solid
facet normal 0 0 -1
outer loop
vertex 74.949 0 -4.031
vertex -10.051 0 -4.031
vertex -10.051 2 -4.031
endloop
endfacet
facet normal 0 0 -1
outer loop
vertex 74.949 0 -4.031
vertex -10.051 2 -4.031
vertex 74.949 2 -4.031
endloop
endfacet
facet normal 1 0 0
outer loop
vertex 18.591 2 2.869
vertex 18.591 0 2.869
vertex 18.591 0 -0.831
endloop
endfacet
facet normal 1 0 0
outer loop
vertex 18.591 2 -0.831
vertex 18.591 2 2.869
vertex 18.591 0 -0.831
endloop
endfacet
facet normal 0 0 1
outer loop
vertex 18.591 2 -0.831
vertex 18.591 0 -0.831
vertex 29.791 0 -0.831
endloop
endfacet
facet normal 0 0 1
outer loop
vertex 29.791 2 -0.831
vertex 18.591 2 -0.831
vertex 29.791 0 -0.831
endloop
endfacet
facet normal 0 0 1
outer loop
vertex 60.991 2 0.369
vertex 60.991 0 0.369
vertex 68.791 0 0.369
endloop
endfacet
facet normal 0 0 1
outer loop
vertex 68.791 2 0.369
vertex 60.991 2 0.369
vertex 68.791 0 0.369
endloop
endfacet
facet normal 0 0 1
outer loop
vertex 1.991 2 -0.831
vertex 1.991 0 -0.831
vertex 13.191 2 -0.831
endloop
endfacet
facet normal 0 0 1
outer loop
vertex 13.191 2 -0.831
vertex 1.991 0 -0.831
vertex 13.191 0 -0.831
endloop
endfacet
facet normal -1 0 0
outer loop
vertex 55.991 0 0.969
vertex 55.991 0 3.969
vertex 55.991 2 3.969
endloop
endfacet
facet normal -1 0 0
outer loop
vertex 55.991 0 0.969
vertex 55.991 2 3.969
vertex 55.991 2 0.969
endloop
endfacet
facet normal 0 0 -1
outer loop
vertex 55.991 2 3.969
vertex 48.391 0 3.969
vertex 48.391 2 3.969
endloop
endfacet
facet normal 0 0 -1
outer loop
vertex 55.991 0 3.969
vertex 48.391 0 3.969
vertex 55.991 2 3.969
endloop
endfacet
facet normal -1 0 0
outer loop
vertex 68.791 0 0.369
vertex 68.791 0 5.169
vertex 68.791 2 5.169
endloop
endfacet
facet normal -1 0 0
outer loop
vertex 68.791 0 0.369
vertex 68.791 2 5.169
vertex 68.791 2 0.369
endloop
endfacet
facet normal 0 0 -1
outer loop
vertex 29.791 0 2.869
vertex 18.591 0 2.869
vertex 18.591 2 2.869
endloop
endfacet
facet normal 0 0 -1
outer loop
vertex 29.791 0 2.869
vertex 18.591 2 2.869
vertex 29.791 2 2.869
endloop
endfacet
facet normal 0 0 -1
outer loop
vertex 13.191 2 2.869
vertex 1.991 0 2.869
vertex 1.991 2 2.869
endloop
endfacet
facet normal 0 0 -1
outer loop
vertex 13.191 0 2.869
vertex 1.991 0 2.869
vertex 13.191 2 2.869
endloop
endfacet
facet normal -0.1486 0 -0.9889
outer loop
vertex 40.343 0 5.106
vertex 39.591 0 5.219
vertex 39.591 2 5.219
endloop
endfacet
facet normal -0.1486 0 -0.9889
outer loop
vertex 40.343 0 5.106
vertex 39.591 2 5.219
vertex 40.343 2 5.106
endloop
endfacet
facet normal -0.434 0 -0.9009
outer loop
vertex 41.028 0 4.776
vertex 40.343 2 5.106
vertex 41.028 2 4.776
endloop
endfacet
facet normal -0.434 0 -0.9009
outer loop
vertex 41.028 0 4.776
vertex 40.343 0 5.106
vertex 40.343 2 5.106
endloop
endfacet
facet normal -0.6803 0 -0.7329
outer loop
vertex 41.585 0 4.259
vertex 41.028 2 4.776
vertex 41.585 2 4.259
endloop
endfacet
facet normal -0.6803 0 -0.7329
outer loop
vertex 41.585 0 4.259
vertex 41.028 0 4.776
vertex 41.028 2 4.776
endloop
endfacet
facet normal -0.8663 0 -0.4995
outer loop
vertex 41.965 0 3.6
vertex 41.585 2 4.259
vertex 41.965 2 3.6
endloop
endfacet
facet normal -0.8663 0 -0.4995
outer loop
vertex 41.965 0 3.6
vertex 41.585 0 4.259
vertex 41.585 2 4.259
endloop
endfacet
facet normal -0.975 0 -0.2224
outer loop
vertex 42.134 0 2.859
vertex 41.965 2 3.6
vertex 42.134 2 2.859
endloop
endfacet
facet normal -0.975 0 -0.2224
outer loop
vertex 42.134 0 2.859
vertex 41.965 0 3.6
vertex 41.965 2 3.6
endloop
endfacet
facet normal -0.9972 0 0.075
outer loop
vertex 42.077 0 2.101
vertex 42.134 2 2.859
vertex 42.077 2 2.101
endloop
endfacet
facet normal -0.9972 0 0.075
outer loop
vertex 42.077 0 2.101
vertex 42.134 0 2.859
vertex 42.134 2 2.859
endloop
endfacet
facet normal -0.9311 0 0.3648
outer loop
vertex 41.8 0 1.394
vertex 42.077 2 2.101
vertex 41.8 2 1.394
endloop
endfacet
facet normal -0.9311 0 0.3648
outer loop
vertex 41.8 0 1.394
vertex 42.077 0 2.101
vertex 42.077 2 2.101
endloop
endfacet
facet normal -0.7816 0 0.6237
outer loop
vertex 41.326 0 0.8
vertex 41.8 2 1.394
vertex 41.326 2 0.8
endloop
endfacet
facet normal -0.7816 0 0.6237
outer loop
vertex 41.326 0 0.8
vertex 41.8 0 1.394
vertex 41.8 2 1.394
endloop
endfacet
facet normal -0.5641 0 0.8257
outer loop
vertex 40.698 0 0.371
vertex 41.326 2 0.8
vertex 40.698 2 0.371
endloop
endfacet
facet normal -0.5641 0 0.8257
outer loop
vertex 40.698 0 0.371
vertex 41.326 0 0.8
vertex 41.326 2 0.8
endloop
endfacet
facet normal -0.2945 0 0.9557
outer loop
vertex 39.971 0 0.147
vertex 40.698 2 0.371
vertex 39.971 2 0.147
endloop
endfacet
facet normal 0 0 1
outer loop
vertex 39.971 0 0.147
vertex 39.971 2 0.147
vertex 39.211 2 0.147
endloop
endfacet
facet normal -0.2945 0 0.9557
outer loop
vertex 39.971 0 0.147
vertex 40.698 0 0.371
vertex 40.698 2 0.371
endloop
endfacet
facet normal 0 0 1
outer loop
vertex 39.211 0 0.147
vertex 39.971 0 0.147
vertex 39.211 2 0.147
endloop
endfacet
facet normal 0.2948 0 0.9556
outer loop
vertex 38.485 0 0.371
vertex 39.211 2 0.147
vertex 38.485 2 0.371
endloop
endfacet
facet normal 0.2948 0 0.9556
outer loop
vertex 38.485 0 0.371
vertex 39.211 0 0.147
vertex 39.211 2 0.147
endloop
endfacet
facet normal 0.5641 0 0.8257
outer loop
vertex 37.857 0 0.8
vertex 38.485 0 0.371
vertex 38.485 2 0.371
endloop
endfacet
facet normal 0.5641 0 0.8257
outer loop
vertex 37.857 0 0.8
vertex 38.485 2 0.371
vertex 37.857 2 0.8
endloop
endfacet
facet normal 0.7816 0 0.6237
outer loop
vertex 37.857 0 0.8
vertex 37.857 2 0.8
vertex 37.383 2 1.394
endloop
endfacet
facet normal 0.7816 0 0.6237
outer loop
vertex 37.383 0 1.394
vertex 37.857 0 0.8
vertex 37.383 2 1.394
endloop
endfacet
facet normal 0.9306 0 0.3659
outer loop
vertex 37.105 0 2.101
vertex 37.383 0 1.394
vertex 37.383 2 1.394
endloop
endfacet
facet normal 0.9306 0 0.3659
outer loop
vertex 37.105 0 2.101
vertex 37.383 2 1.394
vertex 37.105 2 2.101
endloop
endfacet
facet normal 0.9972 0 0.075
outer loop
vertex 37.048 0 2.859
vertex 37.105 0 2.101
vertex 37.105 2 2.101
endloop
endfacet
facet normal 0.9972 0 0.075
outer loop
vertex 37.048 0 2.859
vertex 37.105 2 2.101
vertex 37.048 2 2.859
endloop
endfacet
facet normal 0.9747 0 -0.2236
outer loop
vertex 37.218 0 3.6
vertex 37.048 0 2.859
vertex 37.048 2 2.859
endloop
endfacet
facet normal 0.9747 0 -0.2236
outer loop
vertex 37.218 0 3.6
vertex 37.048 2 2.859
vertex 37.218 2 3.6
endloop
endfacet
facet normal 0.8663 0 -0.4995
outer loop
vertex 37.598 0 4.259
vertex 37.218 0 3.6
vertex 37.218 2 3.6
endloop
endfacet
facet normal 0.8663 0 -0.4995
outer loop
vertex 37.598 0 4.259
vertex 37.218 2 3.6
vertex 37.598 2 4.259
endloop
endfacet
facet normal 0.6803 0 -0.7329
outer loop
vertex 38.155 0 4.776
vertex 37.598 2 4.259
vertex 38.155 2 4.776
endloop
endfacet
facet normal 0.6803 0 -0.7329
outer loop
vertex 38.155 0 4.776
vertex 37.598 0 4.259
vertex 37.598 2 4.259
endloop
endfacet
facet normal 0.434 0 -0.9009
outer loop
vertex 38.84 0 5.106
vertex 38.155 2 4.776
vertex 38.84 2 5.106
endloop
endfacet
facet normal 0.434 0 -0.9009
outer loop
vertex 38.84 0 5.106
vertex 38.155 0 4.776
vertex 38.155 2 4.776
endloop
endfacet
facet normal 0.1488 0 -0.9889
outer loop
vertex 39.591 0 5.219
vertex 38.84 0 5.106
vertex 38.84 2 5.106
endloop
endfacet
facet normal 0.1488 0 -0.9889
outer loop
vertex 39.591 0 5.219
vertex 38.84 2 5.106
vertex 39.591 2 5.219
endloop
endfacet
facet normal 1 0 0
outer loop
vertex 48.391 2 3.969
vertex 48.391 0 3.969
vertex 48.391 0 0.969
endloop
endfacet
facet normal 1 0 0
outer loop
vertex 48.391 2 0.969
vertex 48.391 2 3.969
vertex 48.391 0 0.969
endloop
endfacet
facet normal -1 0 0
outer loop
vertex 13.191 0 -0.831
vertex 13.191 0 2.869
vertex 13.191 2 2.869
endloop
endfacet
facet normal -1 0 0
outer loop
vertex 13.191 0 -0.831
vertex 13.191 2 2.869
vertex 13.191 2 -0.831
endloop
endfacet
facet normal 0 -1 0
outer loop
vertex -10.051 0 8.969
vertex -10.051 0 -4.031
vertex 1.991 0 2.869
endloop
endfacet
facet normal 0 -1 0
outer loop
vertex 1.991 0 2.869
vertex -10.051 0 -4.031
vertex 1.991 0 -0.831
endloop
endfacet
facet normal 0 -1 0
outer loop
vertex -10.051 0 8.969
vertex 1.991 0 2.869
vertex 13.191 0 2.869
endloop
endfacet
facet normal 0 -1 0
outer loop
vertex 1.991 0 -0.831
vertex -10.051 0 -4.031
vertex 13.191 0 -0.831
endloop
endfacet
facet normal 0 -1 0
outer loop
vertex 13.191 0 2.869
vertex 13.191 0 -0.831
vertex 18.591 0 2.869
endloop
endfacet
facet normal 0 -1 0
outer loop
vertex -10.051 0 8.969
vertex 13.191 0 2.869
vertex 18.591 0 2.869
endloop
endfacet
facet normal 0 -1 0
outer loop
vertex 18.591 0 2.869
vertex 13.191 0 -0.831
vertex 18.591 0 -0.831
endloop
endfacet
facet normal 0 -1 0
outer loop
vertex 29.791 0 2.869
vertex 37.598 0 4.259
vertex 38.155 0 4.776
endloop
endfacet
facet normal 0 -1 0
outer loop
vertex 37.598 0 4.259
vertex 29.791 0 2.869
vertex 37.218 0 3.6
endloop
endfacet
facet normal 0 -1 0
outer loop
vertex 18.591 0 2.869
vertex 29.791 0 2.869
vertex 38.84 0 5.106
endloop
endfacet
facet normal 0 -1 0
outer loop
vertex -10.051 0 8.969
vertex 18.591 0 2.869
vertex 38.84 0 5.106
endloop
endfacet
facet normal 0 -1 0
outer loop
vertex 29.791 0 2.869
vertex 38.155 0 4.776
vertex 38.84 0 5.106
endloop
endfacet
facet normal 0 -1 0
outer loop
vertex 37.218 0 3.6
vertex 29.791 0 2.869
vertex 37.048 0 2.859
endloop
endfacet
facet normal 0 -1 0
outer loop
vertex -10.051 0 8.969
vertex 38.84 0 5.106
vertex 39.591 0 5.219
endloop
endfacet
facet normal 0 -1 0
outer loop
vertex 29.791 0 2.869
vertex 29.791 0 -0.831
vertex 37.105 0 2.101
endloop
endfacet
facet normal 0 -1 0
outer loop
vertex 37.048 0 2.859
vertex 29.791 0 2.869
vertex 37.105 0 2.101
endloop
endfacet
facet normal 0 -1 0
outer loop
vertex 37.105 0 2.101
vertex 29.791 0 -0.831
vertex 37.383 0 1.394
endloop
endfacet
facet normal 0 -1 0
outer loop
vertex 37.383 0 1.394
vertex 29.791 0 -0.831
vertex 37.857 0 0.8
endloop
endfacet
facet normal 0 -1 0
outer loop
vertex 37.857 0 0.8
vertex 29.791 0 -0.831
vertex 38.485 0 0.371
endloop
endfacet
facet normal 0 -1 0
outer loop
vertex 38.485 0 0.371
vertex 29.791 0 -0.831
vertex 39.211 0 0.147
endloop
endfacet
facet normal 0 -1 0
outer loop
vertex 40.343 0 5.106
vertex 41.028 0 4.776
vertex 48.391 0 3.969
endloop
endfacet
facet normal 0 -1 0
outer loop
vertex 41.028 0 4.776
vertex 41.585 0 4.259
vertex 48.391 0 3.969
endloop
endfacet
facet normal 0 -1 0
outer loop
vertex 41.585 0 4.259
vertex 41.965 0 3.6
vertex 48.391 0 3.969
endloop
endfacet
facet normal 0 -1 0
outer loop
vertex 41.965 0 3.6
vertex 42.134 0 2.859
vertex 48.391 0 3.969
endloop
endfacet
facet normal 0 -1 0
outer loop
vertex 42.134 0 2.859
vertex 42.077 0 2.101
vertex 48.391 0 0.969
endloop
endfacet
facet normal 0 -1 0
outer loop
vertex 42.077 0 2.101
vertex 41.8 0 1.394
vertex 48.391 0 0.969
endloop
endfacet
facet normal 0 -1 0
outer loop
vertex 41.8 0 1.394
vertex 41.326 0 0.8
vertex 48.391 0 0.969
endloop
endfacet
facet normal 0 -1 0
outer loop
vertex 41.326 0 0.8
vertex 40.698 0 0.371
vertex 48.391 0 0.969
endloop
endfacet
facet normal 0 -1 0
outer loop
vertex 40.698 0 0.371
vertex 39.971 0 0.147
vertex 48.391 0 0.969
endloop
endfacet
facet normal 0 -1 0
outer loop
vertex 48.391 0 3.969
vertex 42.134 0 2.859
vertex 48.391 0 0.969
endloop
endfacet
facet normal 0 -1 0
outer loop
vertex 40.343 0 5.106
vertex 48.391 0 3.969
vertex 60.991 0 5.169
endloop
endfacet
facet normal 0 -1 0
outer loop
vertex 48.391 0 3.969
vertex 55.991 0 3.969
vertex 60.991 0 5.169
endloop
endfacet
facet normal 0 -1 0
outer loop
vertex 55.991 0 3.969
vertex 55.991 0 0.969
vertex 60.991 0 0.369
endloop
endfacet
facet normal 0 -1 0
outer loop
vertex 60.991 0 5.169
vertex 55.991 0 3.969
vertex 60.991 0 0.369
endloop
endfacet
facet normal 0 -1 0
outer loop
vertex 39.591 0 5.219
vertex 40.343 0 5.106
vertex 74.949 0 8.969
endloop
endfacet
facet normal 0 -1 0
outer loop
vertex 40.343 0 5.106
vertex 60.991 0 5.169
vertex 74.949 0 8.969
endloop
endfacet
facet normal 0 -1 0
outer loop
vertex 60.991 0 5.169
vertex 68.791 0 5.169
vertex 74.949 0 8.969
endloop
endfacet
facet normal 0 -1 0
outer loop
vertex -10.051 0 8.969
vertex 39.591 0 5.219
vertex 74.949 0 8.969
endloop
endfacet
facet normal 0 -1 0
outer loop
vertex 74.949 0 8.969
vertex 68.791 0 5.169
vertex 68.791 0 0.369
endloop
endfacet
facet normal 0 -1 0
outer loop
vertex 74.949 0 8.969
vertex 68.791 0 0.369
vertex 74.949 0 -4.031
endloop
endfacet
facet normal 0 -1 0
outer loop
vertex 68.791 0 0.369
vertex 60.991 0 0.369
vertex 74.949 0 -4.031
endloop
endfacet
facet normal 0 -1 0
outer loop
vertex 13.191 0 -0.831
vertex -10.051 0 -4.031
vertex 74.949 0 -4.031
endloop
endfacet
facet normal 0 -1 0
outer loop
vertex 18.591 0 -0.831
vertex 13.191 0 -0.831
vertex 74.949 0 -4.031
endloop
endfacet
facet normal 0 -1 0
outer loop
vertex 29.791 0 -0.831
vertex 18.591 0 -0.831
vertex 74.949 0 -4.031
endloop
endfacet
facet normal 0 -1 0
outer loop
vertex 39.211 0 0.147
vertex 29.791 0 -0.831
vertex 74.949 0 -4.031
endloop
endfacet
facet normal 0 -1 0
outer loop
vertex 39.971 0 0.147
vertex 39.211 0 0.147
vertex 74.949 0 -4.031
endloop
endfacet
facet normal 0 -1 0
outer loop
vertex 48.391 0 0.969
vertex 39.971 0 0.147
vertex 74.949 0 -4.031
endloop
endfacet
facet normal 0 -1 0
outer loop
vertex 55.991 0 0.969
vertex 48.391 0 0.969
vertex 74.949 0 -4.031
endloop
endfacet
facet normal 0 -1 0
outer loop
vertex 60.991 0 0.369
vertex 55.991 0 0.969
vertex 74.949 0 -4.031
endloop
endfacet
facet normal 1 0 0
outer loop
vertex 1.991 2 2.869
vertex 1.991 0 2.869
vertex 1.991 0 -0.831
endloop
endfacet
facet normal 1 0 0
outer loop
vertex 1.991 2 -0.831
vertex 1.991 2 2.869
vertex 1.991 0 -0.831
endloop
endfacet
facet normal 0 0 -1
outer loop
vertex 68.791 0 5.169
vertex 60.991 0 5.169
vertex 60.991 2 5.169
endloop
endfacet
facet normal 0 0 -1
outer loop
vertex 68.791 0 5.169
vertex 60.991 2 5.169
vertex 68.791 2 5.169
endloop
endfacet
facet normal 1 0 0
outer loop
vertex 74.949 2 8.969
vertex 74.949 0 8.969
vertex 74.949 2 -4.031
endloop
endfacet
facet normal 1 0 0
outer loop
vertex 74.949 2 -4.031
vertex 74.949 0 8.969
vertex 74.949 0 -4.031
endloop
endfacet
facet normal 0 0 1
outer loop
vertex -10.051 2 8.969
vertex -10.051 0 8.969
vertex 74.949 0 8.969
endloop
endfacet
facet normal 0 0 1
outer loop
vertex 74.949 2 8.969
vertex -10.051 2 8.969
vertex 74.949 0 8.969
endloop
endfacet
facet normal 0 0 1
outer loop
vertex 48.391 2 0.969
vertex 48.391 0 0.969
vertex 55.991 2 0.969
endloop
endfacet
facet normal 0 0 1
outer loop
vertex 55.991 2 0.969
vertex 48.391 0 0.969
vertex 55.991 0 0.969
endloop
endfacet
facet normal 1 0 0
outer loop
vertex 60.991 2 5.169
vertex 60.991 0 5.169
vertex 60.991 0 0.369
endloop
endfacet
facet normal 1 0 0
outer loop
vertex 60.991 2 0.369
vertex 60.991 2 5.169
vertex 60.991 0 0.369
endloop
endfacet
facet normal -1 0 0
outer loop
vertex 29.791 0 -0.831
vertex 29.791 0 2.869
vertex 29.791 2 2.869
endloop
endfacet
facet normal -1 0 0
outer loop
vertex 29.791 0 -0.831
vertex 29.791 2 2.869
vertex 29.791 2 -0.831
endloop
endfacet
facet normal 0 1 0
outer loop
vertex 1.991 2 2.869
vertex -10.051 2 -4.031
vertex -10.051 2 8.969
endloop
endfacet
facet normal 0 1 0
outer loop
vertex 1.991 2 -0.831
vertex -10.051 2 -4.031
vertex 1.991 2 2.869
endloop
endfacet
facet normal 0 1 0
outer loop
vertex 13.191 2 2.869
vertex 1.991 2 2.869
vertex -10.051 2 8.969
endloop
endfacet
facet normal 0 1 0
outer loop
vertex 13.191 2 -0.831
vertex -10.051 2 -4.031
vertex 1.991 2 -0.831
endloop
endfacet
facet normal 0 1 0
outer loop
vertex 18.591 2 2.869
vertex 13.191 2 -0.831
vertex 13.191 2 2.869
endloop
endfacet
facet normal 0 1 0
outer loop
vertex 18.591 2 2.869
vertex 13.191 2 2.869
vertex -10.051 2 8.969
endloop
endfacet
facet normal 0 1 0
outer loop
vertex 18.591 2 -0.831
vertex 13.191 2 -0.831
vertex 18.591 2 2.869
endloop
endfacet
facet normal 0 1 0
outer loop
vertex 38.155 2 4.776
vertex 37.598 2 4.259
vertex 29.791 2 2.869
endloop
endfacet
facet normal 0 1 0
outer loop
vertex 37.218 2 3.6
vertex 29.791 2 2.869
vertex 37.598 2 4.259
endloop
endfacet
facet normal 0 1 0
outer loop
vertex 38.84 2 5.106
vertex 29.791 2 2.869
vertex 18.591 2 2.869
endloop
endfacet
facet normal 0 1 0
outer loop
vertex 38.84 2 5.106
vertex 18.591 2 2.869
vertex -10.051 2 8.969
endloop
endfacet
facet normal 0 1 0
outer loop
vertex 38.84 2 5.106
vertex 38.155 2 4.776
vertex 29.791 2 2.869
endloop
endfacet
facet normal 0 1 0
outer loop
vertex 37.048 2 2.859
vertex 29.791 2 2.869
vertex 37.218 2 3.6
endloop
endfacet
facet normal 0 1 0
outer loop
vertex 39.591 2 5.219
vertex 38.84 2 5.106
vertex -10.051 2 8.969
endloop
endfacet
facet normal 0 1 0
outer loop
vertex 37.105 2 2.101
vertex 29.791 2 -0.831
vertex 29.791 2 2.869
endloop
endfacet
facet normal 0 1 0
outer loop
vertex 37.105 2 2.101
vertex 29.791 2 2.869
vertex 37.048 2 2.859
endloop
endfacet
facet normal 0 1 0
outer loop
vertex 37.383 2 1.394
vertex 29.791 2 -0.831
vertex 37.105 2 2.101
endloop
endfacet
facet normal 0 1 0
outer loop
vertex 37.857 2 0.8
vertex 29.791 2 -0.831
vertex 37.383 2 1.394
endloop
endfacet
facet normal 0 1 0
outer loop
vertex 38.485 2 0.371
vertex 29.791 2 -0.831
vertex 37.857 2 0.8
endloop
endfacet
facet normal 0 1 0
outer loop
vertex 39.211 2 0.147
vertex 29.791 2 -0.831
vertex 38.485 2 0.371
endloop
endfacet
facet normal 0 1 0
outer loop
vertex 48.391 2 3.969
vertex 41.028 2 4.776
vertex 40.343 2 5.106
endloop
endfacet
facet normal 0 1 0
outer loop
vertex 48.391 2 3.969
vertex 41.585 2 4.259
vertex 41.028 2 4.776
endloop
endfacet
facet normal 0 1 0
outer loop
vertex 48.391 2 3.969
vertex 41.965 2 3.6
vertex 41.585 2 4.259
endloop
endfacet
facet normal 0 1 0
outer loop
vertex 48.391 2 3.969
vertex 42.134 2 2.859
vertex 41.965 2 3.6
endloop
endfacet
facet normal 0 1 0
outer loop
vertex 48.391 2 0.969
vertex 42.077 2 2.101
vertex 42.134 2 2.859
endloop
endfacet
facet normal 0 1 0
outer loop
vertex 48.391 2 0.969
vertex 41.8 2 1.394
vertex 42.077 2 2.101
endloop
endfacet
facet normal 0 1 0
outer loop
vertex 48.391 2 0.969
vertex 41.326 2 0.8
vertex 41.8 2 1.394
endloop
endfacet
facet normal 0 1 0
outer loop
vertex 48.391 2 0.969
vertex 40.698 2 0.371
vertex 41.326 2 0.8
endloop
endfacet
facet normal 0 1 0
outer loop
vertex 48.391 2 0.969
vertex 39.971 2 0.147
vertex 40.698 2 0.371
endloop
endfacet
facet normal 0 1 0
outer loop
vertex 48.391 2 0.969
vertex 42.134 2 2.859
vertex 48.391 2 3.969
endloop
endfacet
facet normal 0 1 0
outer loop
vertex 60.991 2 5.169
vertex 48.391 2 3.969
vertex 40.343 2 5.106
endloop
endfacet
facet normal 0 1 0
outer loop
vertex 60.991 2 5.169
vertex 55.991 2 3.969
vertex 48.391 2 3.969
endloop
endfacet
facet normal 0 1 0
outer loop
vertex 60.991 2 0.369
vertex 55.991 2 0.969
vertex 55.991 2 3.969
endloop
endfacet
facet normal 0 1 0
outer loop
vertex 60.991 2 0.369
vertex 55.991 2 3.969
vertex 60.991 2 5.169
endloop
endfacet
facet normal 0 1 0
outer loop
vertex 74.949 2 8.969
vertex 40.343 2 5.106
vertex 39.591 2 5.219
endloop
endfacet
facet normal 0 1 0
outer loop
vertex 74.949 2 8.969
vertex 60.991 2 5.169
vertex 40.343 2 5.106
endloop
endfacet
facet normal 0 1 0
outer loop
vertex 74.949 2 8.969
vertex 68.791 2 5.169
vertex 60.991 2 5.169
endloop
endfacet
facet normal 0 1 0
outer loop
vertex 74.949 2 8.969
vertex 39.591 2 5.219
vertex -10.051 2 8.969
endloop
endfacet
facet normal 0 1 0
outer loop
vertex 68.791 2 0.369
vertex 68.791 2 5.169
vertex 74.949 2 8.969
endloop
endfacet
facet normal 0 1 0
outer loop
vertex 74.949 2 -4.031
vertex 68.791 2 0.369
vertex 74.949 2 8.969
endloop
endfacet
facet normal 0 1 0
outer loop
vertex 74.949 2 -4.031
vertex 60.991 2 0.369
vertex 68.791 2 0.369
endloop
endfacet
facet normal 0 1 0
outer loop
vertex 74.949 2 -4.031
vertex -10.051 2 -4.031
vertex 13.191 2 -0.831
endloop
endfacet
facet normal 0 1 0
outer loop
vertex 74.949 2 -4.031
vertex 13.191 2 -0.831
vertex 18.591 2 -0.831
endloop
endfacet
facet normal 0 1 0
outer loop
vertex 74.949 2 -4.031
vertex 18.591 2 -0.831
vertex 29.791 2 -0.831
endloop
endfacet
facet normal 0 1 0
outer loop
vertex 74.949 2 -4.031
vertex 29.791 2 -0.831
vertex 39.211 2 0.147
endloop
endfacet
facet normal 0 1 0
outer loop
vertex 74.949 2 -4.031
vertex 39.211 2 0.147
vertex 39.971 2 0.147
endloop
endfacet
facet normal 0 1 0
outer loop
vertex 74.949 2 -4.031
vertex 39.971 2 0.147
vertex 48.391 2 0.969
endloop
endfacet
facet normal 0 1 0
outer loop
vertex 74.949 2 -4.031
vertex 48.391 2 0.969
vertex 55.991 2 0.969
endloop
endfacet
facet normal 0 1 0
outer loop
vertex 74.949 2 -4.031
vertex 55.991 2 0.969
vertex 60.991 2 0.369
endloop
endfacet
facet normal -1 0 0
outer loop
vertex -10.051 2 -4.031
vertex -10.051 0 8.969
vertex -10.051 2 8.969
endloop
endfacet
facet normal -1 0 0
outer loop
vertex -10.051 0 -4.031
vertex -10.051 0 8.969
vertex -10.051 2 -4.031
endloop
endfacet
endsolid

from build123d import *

# Parameters (mm, degrees)
SKETCH_1_W      = 85
SKETCH_1_H      = 13
SKETCH_1_R      = 2.55
SKETCH_1_W_2    = 7.8
SKETCH_1_H_2    = 4.8
SKETCH_1_W_3    = 7.6
SKETCH_1_H_3    = 3
SKETCH_1_W_4    = 11.2
SKETCH_1_H_4    = 3.7
EXTRUDE_5_DEPTH = 2


with BuildPart() as part:
    # 草图1 → 凸台-拉伸5 (new body)
    with BuildSketch(Plane(origin=(0, 0, 0), x_dir=(1, 0, 0), z_dir=(0, 1, 0))):
        with Locations((32.448630137, -2.468848032)):
            Rectangle(SKETCH_1_W, SKETCH_1_H)
        with Locations(Location((39.591348171, -2.668848032, 0), (0, 0, 270))):
            Circle(SKETCH_1_R, mode=Mode.SUBTRACT)
        with Locations((64.891348171, -2.768848032)):
            Rectangle(SKETCH_1_W_2, SKETCH_1_H_2, mode=Mode.SUBTRACT)
        with Locations((52.191348171, -2.468848032)):
            Rectangle(SKETCH_1_W_3, SKETCH_1_H_3, mode=Mode.SUBTRACT)
        with Locations((24.191348171, -1.018848032)):
            Rectangle(SKETCH_1_W_4, SKETCH_1_H_4, mode=Mode.SUBTRACT)
        with Locations((7.591348171, -1.018848032)):
            Rectangle(SKETCH_1_W_4, SKETCH_1_H_4, mode=Mode.SUBTRACT)
    extrude(amount=EXTRUDE_5_DEPTH)


solid = part.part
